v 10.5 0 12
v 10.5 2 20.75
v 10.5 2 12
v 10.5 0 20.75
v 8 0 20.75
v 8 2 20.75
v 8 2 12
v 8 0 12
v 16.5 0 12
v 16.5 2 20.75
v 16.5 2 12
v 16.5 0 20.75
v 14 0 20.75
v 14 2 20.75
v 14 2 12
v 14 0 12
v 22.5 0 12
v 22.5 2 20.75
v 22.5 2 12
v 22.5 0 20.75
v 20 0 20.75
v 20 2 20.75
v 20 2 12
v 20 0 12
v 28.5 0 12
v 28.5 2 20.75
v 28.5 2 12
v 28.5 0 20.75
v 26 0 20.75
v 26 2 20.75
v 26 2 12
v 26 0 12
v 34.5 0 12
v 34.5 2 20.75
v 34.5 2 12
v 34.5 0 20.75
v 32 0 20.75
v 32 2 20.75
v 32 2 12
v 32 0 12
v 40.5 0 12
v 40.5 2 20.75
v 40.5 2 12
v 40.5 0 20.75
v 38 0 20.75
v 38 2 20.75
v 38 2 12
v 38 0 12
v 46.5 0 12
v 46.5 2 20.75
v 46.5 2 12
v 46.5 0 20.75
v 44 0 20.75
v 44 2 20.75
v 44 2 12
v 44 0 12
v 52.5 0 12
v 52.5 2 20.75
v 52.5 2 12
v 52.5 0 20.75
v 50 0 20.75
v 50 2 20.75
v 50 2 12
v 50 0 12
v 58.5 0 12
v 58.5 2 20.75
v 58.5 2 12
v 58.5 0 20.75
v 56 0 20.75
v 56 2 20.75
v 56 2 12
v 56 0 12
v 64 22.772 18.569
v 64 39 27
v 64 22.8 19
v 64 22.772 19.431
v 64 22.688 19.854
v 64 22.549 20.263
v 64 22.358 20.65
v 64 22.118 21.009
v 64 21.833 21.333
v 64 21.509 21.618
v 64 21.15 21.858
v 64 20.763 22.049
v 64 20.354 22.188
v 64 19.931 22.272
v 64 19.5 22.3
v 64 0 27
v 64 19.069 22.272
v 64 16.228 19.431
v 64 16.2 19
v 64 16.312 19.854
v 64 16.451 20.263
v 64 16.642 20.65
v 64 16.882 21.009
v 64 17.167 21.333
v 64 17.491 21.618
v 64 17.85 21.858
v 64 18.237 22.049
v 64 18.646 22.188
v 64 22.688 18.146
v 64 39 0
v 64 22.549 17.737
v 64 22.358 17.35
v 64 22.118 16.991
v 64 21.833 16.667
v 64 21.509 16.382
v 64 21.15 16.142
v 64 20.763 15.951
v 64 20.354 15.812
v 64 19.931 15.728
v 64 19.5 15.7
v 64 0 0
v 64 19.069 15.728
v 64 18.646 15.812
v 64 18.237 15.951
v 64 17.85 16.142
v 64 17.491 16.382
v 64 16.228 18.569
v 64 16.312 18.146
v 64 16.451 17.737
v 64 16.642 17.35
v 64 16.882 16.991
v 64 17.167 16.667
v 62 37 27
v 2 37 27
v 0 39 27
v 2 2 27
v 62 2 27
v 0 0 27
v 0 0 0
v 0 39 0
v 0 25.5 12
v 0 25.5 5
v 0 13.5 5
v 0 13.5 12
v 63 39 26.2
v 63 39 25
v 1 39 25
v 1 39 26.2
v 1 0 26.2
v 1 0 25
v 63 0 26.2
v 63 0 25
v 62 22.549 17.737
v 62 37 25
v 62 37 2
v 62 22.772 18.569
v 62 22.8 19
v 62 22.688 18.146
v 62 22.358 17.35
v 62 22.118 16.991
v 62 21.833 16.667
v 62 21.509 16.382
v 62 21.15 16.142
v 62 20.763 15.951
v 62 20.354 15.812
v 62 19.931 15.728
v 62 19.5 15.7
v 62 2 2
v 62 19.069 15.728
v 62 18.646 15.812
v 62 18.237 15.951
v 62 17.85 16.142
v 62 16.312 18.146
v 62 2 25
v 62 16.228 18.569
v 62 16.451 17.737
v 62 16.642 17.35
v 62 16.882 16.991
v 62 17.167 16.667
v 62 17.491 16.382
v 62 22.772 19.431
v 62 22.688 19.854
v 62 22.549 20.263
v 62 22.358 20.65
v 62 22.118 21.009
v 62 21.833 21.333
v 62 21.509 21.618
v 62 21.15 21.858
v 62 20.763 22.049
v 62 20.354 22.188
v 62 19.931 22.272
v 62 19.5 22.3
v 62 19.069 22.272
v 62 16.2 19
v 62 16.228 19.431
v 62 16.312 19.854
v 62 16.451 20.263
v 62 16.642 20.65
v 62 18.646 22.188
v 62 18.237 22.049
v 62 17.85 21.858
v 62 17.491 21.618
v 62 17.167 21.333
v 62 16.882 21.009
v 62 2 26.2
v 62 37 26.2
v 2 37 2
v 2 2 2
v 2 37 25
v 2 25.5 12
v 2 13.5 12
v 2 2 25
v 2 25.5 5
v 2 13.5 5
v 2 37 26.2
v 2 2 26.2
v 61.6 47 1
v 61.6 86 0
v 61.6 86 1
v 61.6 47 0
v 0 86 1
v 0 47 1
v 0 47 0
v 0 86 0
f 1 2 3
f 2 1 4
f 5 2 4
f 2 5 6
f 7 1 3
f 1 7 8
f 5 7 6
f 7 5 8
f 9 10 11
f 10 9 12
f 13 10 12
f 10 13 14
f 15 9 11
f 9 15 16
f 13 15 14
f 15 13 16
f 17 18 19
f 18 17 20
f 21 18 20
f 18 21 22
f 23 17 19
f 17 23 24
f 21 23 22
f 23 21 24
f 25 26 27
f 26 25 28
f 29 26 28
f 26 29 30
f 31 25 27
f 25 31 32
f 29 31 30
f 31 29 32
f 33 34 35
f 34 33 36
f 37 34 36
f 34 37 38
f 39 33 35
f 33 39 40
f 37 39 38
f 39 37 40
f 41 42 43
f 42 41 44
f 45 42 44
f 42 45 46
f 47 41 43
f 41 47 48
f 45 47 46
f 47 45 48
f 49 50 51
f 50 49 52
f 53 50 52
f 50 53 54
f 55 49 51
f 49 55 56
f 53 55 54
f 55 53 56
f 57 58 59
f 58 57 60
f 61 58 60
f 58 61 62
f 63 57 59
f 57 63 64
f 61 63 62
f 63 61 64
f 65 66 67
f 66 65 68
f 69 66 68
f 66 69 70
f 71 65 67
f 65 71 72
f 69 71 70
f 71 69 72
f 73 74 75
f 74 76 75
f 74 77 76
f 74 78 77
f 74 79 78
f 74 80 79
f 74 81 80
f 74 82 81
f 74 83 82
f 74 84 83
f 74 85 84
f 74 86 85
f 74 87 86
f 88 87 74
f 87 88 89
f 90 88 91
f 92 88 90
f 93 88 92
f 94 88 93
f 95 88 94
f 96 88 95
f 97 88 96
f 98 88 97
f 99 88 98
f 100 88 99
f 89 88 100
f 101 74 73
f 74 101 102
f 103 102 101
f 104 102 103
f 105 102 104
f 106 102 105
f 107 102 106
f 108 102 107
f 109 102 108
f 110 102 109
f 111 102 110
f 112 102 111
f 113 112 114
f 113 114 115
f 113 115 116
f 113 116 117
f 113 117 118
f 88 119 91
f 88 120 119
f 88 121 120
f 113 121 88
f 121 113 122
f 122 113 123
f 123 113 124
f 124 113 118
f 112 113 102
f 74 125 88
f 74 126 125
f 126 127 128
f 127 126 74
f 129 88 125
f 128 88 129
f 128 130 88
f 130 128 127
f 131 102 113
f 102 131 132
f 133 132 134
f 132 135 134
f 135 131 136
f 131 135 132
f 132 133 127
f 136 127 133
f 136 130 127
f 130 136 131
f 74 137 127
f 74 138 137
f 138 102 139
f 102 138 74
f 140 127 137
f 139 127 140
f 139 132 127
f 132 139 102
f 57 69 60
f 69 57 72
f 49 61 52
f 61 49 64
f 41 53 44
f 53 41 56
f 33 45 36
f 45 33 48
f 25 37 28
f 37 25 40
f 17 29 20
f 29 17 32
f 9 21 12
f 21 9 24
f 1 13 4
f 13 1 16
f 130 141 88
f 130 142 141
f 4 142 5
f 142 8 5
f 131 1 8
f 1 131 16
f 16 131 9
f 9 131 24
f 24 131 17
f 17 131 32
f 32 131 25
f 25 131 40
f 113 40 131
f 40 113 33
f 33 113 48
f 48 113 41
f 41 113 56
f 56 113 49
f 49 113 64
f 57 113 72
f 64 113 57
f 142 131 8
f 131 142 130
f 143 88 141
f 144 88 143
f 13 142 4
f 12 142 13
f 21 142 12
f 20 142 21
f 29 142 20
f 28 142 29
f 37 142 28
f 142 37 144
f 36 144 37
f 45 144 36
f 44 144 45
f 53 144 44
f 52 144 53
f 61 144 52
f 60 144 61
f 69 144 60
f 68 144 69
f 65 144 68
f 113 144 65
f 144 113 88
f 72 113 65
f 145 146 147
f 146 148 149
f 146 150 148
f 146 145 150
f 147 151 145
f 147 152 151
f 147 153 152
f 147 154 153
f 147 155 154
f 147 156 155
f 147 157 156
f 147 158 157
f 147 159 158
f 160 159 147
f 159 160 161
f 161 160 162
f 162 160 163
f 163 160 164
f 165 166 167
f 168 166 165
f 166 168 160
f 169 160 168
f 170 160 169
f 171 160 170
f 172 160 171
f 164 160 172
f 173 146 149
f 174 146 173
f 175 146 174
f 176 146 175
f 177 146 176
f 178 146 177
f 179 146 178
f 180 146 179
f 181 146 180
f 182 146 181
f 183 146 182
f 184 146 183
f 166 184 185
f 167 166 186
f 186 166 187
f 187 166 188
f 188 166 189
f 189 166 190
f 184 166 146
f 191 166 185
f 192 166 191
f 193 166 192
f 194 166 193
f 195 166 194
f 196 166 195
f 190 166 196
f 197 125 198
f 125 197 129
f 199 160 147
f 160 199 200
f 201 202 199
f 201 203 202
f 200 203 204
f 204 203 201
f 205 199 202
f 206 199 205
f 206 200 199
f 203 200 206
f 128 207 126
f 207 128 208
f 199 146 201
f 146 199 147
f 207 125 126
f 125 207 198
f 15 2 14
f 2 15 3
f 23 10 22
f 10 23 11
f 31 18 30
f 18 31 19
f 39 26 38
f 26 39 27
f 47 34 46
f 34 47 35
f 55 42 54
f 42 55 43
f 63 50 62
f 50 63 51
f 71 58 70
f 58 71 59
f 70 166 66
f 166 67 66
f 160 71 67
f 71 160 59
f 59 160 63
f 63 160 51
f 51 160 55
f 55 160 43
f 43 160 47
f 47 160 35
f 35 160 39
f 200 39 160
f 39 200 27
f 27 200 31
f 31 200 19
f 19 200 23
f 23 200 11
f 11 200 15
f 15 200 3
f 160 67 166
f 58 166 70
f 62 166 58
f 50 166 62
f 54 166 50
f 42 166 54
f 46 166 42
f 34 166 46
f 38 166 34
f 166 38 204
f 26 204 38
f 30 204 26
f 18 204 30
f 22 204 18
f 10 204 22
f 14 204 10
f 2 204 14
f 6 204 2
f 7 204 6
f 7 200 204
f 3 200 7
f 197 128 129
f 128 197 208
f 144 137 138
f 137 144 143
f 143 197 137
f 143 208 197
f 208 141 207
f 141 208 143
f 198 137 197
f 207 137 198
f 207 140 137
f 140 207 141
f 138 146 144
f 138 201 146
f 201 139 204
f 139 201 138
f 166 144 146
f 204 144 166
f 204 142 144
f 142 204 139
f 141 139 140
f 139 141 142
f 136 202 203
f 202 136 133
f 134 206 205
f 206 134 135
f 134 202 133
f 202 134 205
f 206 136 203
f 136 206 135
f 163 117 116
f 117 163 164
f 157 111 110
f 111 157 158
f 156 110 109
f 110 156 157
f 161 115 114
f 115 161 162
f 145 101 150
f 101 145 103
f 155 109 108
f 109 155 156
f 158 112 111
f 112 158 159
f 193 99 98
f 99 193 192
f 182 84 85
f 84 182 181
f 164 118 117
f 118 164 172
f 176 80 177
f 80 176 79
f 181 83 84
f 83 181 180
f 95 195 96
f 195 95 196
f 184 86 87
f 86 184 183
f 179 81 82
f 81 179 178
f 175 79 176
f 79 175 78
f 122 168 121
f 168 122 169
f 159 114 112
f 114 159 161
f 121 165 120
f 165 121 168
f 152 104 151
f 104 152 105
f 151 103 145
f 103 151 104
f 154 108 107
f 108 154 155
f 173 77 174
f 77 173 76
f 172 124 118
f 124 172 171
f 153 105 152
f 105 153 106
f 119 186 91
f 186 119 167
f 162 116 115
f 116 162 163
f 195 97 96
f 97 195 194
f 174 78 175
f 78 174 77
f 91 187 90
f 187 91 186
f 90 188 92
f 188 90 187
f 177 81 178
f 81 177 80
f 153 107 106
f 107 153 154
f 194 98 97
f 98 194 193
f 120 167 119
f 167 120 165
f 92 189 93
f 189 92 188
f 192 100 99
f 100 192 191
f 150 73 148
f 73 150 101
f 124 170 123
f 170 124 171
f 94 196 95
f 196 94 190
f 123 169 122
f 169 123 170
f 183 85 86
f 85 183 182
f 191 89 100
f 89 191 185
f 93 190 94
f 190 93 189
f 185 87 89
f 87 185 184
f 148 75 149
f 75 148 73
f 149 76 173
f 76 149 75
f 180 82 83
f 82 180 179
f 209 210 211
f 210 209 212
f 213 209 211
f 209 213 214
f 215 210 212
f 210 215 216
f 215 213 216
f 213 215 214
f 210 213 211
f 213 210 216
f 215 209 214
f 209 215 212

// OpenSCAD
// Electronics project box with slide-on lid and optional SMA antenna hole. CC0.
// Inner size in mm; check your board (and battery) fit before printing.
inner = [60, 35, 25]; wall = 2; sma = true; usb = [12, 7]; part = "both";  // "box", "lid", "both"
$fn = 48;
o = inner + [2 * wall, 2 * wall, wall];
module box() {
  difference() {
    cube(o);
    translate([wall, wall, wall]) cube(inner + [0, 0, 1]);
    translate([wall / 2, -1, o.z - wall]) cube([inner.x + wall, o.y + 2, wall / 2 + 0.2]);   // lid groove... open front
    translate([-1, wall + inner.y / 2 - usb.x / 2, wall + 3]) cube([wall + 2, usb.x, usb.y]);  // USB opening
    if (sma) translate([o.x - wall - 1, o.y / 2, o.z - 8]) rotate([0, 90, 0]) cylinder(d = 6.6, h = wall + 2);  // SMA bulkhead
    for (x = [8 : 6 : o.x - 8]) translate([x, -1, wall + inner.z * 0.4]) cube([2.5, wall + 2, inner.z * 0.35]);  // vents
  }
}
module lid() { translate([0, 0, 0]) cube([inner.x + wall - 0.4, o.y, wall / 2]); }
if (part != "lid") box();
if (part != "box") translate([0, o.y + 8, 0]) lid();
